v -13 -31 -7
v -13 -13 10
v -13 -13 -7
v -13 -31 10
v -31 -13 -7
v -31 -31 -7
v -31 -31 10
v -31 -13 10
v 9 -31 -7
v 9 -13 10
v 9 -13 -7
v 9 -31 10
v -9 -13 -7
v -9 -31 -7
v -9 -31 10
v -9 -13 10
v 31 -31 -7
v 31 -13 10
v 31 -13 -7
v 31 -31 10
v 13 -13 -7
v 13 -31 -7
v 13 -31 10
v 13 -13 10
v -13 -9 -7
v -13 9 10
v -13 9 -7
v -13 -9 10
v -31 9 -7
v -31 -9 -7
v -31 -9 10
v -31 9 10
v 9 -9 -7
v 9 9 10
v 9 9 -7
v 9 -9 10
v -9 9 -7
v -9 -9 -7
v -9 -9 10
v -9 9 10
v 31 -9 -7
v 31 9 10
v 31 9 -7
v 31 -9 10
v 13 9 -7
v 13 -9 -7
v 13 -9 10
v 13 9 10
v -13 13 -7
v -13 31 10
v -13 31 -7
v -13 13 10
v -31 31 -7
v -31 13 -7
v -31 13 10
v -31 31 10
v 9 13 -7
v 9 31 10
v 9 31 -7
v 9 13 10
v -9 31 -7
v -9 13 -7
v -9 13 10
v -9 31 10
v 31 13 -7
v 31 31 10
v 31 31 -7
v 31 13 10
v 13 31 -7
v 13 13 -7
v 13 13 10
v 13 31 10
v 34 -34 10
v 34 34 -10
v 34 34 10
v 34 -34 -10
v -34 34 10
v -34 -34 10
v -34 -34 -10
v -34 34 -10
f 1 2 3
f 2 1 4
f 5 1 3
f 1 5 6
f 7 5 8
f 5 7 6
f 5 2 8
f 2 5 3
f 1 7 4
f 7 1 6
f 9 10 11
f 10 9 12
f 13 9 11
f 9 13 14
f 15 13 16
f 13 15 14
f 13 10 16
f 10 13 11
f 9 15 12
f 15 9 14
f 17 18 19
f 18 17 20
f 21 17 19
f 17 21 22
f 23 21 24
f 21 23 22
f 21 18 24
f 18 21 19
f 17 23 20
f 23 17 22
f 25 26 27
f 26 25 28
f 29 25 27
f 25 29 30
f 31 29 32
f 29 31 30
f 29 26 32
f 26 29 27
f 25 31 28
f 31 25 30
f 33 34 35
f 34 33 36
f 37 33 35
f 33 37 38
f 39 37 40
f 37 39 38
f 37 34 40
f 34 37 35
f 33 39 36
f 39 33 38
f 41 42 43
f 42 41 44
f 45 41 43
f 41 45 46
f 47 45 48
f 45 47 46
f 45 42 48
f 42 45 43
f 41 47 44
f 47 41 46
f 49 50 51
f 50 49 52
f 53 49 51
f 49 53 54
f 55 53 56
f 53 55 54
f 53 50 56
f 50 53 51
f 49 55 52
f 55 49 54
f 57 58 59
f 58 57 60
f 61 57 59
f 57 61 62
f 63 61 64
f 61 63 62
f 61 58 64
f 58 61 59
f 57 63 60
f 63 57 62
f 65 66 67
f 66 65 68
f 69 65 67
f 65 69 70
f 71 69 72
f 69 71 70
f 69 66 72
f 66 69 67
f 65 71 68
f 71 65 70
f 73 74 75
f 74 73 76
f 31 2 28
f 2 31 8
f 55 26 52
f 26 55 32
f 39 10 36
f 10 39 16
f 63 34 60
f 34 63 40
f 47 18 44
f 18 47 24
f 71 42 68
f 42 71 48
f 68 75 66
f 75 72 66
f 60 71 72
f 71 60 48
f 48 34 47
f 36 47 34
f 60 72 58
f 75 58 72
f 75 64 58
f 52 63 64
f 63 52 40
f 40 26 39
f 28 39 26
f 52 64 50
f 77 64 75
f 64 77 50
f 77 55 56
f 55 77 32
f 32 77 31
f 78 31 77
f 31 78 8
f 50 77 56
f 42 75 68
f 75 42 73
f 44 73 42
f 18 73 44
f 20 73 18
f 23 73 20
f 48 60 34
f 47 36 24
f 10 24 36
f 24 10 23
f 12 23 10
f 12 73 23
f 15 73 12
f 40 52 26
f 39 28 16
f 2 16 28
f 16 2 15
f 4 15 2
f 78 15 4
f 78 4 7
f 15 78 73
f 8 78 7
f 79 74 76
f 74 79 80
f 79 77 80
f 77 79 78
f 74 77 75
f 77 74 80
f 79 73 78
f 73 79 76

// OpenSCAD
$fn = 32;

// ----------------------------------------------------------------------
// Pocket plate 68 x 68 x 20
// 3 x 3 pockets 18 mm square, 17 mm deep
// ----------------------------------------------------------------------

// --- parameters (mm) ---
thickness = 20;  // plate thickness
floor_t = 3;     // material left under each pocket
pocket = 18;     // pocket side length
pitch_x = 22;    // pocket pitch along X
pitch_y = 22;    // pocket pitch along Y
cols = 3;        // pockets per row
rows = 3;        // rows of pockets

// --- derived feature positions (mm) ---
depth = thickness - floor_t;        // = 17   pocket depth, down to the floor
span_x = (cols - 1) * pitch_x;      // = 44   distance between outer pockets
span_y = (rows - 1) * pitch_y;      // = 44   distance between outer pocket rows
origin_x = -span_x / 2;             // = -22   X of the first pocket
origin_y = -span_y / 2;             // = -22   Y of the first pocket
plate = [span_x + pocket + 6, span_y + pocket + 6, thickness];  // = [68, 68, 20]   overall size: pockets plus 3 mm of wall on each side
feature_centers = [
  [origin_x + 0 * pitch_x, origin_y + 0 * pitch_y],
  [origin_x + 1 * pitch_x, origin_y + 0 * pitch_y],
  [origin_x + 2 * pitch_x, origin_y + 0 * pitch_y],
  [origin_x + 0 * pitch_x, origin_y + 1 * pitch_y],
  [origin_x + 1 * pitch_x, origin_y + 1 * pitch_y],
  [origin_x + 2 * pitch_x, origin_y + 1 * pitch_y],
  [origin_x + 0 * pitch_x, origin_y + 2 * pitch_y],
  [origin_x + 1 * pitch_x, origin_y + 2 * pitch_y],
  [origin_x + 2 * pitch_x, origin_y + 2 * pitch_y]
];   // pocket centres, used verbatim by the cutter loop

// plate outline, then one pocket per centre in feature_centers
difference() {
  cube(plate, center = true);
  for (centre = feature_centers)
    translate([centre[0] - pocket / 2, centre[1] - pocket / 2, plate[2] / 2 - depth])
      cube([pocket, pocket, depth + 1]);  // centred on the declared pocket centre
}
